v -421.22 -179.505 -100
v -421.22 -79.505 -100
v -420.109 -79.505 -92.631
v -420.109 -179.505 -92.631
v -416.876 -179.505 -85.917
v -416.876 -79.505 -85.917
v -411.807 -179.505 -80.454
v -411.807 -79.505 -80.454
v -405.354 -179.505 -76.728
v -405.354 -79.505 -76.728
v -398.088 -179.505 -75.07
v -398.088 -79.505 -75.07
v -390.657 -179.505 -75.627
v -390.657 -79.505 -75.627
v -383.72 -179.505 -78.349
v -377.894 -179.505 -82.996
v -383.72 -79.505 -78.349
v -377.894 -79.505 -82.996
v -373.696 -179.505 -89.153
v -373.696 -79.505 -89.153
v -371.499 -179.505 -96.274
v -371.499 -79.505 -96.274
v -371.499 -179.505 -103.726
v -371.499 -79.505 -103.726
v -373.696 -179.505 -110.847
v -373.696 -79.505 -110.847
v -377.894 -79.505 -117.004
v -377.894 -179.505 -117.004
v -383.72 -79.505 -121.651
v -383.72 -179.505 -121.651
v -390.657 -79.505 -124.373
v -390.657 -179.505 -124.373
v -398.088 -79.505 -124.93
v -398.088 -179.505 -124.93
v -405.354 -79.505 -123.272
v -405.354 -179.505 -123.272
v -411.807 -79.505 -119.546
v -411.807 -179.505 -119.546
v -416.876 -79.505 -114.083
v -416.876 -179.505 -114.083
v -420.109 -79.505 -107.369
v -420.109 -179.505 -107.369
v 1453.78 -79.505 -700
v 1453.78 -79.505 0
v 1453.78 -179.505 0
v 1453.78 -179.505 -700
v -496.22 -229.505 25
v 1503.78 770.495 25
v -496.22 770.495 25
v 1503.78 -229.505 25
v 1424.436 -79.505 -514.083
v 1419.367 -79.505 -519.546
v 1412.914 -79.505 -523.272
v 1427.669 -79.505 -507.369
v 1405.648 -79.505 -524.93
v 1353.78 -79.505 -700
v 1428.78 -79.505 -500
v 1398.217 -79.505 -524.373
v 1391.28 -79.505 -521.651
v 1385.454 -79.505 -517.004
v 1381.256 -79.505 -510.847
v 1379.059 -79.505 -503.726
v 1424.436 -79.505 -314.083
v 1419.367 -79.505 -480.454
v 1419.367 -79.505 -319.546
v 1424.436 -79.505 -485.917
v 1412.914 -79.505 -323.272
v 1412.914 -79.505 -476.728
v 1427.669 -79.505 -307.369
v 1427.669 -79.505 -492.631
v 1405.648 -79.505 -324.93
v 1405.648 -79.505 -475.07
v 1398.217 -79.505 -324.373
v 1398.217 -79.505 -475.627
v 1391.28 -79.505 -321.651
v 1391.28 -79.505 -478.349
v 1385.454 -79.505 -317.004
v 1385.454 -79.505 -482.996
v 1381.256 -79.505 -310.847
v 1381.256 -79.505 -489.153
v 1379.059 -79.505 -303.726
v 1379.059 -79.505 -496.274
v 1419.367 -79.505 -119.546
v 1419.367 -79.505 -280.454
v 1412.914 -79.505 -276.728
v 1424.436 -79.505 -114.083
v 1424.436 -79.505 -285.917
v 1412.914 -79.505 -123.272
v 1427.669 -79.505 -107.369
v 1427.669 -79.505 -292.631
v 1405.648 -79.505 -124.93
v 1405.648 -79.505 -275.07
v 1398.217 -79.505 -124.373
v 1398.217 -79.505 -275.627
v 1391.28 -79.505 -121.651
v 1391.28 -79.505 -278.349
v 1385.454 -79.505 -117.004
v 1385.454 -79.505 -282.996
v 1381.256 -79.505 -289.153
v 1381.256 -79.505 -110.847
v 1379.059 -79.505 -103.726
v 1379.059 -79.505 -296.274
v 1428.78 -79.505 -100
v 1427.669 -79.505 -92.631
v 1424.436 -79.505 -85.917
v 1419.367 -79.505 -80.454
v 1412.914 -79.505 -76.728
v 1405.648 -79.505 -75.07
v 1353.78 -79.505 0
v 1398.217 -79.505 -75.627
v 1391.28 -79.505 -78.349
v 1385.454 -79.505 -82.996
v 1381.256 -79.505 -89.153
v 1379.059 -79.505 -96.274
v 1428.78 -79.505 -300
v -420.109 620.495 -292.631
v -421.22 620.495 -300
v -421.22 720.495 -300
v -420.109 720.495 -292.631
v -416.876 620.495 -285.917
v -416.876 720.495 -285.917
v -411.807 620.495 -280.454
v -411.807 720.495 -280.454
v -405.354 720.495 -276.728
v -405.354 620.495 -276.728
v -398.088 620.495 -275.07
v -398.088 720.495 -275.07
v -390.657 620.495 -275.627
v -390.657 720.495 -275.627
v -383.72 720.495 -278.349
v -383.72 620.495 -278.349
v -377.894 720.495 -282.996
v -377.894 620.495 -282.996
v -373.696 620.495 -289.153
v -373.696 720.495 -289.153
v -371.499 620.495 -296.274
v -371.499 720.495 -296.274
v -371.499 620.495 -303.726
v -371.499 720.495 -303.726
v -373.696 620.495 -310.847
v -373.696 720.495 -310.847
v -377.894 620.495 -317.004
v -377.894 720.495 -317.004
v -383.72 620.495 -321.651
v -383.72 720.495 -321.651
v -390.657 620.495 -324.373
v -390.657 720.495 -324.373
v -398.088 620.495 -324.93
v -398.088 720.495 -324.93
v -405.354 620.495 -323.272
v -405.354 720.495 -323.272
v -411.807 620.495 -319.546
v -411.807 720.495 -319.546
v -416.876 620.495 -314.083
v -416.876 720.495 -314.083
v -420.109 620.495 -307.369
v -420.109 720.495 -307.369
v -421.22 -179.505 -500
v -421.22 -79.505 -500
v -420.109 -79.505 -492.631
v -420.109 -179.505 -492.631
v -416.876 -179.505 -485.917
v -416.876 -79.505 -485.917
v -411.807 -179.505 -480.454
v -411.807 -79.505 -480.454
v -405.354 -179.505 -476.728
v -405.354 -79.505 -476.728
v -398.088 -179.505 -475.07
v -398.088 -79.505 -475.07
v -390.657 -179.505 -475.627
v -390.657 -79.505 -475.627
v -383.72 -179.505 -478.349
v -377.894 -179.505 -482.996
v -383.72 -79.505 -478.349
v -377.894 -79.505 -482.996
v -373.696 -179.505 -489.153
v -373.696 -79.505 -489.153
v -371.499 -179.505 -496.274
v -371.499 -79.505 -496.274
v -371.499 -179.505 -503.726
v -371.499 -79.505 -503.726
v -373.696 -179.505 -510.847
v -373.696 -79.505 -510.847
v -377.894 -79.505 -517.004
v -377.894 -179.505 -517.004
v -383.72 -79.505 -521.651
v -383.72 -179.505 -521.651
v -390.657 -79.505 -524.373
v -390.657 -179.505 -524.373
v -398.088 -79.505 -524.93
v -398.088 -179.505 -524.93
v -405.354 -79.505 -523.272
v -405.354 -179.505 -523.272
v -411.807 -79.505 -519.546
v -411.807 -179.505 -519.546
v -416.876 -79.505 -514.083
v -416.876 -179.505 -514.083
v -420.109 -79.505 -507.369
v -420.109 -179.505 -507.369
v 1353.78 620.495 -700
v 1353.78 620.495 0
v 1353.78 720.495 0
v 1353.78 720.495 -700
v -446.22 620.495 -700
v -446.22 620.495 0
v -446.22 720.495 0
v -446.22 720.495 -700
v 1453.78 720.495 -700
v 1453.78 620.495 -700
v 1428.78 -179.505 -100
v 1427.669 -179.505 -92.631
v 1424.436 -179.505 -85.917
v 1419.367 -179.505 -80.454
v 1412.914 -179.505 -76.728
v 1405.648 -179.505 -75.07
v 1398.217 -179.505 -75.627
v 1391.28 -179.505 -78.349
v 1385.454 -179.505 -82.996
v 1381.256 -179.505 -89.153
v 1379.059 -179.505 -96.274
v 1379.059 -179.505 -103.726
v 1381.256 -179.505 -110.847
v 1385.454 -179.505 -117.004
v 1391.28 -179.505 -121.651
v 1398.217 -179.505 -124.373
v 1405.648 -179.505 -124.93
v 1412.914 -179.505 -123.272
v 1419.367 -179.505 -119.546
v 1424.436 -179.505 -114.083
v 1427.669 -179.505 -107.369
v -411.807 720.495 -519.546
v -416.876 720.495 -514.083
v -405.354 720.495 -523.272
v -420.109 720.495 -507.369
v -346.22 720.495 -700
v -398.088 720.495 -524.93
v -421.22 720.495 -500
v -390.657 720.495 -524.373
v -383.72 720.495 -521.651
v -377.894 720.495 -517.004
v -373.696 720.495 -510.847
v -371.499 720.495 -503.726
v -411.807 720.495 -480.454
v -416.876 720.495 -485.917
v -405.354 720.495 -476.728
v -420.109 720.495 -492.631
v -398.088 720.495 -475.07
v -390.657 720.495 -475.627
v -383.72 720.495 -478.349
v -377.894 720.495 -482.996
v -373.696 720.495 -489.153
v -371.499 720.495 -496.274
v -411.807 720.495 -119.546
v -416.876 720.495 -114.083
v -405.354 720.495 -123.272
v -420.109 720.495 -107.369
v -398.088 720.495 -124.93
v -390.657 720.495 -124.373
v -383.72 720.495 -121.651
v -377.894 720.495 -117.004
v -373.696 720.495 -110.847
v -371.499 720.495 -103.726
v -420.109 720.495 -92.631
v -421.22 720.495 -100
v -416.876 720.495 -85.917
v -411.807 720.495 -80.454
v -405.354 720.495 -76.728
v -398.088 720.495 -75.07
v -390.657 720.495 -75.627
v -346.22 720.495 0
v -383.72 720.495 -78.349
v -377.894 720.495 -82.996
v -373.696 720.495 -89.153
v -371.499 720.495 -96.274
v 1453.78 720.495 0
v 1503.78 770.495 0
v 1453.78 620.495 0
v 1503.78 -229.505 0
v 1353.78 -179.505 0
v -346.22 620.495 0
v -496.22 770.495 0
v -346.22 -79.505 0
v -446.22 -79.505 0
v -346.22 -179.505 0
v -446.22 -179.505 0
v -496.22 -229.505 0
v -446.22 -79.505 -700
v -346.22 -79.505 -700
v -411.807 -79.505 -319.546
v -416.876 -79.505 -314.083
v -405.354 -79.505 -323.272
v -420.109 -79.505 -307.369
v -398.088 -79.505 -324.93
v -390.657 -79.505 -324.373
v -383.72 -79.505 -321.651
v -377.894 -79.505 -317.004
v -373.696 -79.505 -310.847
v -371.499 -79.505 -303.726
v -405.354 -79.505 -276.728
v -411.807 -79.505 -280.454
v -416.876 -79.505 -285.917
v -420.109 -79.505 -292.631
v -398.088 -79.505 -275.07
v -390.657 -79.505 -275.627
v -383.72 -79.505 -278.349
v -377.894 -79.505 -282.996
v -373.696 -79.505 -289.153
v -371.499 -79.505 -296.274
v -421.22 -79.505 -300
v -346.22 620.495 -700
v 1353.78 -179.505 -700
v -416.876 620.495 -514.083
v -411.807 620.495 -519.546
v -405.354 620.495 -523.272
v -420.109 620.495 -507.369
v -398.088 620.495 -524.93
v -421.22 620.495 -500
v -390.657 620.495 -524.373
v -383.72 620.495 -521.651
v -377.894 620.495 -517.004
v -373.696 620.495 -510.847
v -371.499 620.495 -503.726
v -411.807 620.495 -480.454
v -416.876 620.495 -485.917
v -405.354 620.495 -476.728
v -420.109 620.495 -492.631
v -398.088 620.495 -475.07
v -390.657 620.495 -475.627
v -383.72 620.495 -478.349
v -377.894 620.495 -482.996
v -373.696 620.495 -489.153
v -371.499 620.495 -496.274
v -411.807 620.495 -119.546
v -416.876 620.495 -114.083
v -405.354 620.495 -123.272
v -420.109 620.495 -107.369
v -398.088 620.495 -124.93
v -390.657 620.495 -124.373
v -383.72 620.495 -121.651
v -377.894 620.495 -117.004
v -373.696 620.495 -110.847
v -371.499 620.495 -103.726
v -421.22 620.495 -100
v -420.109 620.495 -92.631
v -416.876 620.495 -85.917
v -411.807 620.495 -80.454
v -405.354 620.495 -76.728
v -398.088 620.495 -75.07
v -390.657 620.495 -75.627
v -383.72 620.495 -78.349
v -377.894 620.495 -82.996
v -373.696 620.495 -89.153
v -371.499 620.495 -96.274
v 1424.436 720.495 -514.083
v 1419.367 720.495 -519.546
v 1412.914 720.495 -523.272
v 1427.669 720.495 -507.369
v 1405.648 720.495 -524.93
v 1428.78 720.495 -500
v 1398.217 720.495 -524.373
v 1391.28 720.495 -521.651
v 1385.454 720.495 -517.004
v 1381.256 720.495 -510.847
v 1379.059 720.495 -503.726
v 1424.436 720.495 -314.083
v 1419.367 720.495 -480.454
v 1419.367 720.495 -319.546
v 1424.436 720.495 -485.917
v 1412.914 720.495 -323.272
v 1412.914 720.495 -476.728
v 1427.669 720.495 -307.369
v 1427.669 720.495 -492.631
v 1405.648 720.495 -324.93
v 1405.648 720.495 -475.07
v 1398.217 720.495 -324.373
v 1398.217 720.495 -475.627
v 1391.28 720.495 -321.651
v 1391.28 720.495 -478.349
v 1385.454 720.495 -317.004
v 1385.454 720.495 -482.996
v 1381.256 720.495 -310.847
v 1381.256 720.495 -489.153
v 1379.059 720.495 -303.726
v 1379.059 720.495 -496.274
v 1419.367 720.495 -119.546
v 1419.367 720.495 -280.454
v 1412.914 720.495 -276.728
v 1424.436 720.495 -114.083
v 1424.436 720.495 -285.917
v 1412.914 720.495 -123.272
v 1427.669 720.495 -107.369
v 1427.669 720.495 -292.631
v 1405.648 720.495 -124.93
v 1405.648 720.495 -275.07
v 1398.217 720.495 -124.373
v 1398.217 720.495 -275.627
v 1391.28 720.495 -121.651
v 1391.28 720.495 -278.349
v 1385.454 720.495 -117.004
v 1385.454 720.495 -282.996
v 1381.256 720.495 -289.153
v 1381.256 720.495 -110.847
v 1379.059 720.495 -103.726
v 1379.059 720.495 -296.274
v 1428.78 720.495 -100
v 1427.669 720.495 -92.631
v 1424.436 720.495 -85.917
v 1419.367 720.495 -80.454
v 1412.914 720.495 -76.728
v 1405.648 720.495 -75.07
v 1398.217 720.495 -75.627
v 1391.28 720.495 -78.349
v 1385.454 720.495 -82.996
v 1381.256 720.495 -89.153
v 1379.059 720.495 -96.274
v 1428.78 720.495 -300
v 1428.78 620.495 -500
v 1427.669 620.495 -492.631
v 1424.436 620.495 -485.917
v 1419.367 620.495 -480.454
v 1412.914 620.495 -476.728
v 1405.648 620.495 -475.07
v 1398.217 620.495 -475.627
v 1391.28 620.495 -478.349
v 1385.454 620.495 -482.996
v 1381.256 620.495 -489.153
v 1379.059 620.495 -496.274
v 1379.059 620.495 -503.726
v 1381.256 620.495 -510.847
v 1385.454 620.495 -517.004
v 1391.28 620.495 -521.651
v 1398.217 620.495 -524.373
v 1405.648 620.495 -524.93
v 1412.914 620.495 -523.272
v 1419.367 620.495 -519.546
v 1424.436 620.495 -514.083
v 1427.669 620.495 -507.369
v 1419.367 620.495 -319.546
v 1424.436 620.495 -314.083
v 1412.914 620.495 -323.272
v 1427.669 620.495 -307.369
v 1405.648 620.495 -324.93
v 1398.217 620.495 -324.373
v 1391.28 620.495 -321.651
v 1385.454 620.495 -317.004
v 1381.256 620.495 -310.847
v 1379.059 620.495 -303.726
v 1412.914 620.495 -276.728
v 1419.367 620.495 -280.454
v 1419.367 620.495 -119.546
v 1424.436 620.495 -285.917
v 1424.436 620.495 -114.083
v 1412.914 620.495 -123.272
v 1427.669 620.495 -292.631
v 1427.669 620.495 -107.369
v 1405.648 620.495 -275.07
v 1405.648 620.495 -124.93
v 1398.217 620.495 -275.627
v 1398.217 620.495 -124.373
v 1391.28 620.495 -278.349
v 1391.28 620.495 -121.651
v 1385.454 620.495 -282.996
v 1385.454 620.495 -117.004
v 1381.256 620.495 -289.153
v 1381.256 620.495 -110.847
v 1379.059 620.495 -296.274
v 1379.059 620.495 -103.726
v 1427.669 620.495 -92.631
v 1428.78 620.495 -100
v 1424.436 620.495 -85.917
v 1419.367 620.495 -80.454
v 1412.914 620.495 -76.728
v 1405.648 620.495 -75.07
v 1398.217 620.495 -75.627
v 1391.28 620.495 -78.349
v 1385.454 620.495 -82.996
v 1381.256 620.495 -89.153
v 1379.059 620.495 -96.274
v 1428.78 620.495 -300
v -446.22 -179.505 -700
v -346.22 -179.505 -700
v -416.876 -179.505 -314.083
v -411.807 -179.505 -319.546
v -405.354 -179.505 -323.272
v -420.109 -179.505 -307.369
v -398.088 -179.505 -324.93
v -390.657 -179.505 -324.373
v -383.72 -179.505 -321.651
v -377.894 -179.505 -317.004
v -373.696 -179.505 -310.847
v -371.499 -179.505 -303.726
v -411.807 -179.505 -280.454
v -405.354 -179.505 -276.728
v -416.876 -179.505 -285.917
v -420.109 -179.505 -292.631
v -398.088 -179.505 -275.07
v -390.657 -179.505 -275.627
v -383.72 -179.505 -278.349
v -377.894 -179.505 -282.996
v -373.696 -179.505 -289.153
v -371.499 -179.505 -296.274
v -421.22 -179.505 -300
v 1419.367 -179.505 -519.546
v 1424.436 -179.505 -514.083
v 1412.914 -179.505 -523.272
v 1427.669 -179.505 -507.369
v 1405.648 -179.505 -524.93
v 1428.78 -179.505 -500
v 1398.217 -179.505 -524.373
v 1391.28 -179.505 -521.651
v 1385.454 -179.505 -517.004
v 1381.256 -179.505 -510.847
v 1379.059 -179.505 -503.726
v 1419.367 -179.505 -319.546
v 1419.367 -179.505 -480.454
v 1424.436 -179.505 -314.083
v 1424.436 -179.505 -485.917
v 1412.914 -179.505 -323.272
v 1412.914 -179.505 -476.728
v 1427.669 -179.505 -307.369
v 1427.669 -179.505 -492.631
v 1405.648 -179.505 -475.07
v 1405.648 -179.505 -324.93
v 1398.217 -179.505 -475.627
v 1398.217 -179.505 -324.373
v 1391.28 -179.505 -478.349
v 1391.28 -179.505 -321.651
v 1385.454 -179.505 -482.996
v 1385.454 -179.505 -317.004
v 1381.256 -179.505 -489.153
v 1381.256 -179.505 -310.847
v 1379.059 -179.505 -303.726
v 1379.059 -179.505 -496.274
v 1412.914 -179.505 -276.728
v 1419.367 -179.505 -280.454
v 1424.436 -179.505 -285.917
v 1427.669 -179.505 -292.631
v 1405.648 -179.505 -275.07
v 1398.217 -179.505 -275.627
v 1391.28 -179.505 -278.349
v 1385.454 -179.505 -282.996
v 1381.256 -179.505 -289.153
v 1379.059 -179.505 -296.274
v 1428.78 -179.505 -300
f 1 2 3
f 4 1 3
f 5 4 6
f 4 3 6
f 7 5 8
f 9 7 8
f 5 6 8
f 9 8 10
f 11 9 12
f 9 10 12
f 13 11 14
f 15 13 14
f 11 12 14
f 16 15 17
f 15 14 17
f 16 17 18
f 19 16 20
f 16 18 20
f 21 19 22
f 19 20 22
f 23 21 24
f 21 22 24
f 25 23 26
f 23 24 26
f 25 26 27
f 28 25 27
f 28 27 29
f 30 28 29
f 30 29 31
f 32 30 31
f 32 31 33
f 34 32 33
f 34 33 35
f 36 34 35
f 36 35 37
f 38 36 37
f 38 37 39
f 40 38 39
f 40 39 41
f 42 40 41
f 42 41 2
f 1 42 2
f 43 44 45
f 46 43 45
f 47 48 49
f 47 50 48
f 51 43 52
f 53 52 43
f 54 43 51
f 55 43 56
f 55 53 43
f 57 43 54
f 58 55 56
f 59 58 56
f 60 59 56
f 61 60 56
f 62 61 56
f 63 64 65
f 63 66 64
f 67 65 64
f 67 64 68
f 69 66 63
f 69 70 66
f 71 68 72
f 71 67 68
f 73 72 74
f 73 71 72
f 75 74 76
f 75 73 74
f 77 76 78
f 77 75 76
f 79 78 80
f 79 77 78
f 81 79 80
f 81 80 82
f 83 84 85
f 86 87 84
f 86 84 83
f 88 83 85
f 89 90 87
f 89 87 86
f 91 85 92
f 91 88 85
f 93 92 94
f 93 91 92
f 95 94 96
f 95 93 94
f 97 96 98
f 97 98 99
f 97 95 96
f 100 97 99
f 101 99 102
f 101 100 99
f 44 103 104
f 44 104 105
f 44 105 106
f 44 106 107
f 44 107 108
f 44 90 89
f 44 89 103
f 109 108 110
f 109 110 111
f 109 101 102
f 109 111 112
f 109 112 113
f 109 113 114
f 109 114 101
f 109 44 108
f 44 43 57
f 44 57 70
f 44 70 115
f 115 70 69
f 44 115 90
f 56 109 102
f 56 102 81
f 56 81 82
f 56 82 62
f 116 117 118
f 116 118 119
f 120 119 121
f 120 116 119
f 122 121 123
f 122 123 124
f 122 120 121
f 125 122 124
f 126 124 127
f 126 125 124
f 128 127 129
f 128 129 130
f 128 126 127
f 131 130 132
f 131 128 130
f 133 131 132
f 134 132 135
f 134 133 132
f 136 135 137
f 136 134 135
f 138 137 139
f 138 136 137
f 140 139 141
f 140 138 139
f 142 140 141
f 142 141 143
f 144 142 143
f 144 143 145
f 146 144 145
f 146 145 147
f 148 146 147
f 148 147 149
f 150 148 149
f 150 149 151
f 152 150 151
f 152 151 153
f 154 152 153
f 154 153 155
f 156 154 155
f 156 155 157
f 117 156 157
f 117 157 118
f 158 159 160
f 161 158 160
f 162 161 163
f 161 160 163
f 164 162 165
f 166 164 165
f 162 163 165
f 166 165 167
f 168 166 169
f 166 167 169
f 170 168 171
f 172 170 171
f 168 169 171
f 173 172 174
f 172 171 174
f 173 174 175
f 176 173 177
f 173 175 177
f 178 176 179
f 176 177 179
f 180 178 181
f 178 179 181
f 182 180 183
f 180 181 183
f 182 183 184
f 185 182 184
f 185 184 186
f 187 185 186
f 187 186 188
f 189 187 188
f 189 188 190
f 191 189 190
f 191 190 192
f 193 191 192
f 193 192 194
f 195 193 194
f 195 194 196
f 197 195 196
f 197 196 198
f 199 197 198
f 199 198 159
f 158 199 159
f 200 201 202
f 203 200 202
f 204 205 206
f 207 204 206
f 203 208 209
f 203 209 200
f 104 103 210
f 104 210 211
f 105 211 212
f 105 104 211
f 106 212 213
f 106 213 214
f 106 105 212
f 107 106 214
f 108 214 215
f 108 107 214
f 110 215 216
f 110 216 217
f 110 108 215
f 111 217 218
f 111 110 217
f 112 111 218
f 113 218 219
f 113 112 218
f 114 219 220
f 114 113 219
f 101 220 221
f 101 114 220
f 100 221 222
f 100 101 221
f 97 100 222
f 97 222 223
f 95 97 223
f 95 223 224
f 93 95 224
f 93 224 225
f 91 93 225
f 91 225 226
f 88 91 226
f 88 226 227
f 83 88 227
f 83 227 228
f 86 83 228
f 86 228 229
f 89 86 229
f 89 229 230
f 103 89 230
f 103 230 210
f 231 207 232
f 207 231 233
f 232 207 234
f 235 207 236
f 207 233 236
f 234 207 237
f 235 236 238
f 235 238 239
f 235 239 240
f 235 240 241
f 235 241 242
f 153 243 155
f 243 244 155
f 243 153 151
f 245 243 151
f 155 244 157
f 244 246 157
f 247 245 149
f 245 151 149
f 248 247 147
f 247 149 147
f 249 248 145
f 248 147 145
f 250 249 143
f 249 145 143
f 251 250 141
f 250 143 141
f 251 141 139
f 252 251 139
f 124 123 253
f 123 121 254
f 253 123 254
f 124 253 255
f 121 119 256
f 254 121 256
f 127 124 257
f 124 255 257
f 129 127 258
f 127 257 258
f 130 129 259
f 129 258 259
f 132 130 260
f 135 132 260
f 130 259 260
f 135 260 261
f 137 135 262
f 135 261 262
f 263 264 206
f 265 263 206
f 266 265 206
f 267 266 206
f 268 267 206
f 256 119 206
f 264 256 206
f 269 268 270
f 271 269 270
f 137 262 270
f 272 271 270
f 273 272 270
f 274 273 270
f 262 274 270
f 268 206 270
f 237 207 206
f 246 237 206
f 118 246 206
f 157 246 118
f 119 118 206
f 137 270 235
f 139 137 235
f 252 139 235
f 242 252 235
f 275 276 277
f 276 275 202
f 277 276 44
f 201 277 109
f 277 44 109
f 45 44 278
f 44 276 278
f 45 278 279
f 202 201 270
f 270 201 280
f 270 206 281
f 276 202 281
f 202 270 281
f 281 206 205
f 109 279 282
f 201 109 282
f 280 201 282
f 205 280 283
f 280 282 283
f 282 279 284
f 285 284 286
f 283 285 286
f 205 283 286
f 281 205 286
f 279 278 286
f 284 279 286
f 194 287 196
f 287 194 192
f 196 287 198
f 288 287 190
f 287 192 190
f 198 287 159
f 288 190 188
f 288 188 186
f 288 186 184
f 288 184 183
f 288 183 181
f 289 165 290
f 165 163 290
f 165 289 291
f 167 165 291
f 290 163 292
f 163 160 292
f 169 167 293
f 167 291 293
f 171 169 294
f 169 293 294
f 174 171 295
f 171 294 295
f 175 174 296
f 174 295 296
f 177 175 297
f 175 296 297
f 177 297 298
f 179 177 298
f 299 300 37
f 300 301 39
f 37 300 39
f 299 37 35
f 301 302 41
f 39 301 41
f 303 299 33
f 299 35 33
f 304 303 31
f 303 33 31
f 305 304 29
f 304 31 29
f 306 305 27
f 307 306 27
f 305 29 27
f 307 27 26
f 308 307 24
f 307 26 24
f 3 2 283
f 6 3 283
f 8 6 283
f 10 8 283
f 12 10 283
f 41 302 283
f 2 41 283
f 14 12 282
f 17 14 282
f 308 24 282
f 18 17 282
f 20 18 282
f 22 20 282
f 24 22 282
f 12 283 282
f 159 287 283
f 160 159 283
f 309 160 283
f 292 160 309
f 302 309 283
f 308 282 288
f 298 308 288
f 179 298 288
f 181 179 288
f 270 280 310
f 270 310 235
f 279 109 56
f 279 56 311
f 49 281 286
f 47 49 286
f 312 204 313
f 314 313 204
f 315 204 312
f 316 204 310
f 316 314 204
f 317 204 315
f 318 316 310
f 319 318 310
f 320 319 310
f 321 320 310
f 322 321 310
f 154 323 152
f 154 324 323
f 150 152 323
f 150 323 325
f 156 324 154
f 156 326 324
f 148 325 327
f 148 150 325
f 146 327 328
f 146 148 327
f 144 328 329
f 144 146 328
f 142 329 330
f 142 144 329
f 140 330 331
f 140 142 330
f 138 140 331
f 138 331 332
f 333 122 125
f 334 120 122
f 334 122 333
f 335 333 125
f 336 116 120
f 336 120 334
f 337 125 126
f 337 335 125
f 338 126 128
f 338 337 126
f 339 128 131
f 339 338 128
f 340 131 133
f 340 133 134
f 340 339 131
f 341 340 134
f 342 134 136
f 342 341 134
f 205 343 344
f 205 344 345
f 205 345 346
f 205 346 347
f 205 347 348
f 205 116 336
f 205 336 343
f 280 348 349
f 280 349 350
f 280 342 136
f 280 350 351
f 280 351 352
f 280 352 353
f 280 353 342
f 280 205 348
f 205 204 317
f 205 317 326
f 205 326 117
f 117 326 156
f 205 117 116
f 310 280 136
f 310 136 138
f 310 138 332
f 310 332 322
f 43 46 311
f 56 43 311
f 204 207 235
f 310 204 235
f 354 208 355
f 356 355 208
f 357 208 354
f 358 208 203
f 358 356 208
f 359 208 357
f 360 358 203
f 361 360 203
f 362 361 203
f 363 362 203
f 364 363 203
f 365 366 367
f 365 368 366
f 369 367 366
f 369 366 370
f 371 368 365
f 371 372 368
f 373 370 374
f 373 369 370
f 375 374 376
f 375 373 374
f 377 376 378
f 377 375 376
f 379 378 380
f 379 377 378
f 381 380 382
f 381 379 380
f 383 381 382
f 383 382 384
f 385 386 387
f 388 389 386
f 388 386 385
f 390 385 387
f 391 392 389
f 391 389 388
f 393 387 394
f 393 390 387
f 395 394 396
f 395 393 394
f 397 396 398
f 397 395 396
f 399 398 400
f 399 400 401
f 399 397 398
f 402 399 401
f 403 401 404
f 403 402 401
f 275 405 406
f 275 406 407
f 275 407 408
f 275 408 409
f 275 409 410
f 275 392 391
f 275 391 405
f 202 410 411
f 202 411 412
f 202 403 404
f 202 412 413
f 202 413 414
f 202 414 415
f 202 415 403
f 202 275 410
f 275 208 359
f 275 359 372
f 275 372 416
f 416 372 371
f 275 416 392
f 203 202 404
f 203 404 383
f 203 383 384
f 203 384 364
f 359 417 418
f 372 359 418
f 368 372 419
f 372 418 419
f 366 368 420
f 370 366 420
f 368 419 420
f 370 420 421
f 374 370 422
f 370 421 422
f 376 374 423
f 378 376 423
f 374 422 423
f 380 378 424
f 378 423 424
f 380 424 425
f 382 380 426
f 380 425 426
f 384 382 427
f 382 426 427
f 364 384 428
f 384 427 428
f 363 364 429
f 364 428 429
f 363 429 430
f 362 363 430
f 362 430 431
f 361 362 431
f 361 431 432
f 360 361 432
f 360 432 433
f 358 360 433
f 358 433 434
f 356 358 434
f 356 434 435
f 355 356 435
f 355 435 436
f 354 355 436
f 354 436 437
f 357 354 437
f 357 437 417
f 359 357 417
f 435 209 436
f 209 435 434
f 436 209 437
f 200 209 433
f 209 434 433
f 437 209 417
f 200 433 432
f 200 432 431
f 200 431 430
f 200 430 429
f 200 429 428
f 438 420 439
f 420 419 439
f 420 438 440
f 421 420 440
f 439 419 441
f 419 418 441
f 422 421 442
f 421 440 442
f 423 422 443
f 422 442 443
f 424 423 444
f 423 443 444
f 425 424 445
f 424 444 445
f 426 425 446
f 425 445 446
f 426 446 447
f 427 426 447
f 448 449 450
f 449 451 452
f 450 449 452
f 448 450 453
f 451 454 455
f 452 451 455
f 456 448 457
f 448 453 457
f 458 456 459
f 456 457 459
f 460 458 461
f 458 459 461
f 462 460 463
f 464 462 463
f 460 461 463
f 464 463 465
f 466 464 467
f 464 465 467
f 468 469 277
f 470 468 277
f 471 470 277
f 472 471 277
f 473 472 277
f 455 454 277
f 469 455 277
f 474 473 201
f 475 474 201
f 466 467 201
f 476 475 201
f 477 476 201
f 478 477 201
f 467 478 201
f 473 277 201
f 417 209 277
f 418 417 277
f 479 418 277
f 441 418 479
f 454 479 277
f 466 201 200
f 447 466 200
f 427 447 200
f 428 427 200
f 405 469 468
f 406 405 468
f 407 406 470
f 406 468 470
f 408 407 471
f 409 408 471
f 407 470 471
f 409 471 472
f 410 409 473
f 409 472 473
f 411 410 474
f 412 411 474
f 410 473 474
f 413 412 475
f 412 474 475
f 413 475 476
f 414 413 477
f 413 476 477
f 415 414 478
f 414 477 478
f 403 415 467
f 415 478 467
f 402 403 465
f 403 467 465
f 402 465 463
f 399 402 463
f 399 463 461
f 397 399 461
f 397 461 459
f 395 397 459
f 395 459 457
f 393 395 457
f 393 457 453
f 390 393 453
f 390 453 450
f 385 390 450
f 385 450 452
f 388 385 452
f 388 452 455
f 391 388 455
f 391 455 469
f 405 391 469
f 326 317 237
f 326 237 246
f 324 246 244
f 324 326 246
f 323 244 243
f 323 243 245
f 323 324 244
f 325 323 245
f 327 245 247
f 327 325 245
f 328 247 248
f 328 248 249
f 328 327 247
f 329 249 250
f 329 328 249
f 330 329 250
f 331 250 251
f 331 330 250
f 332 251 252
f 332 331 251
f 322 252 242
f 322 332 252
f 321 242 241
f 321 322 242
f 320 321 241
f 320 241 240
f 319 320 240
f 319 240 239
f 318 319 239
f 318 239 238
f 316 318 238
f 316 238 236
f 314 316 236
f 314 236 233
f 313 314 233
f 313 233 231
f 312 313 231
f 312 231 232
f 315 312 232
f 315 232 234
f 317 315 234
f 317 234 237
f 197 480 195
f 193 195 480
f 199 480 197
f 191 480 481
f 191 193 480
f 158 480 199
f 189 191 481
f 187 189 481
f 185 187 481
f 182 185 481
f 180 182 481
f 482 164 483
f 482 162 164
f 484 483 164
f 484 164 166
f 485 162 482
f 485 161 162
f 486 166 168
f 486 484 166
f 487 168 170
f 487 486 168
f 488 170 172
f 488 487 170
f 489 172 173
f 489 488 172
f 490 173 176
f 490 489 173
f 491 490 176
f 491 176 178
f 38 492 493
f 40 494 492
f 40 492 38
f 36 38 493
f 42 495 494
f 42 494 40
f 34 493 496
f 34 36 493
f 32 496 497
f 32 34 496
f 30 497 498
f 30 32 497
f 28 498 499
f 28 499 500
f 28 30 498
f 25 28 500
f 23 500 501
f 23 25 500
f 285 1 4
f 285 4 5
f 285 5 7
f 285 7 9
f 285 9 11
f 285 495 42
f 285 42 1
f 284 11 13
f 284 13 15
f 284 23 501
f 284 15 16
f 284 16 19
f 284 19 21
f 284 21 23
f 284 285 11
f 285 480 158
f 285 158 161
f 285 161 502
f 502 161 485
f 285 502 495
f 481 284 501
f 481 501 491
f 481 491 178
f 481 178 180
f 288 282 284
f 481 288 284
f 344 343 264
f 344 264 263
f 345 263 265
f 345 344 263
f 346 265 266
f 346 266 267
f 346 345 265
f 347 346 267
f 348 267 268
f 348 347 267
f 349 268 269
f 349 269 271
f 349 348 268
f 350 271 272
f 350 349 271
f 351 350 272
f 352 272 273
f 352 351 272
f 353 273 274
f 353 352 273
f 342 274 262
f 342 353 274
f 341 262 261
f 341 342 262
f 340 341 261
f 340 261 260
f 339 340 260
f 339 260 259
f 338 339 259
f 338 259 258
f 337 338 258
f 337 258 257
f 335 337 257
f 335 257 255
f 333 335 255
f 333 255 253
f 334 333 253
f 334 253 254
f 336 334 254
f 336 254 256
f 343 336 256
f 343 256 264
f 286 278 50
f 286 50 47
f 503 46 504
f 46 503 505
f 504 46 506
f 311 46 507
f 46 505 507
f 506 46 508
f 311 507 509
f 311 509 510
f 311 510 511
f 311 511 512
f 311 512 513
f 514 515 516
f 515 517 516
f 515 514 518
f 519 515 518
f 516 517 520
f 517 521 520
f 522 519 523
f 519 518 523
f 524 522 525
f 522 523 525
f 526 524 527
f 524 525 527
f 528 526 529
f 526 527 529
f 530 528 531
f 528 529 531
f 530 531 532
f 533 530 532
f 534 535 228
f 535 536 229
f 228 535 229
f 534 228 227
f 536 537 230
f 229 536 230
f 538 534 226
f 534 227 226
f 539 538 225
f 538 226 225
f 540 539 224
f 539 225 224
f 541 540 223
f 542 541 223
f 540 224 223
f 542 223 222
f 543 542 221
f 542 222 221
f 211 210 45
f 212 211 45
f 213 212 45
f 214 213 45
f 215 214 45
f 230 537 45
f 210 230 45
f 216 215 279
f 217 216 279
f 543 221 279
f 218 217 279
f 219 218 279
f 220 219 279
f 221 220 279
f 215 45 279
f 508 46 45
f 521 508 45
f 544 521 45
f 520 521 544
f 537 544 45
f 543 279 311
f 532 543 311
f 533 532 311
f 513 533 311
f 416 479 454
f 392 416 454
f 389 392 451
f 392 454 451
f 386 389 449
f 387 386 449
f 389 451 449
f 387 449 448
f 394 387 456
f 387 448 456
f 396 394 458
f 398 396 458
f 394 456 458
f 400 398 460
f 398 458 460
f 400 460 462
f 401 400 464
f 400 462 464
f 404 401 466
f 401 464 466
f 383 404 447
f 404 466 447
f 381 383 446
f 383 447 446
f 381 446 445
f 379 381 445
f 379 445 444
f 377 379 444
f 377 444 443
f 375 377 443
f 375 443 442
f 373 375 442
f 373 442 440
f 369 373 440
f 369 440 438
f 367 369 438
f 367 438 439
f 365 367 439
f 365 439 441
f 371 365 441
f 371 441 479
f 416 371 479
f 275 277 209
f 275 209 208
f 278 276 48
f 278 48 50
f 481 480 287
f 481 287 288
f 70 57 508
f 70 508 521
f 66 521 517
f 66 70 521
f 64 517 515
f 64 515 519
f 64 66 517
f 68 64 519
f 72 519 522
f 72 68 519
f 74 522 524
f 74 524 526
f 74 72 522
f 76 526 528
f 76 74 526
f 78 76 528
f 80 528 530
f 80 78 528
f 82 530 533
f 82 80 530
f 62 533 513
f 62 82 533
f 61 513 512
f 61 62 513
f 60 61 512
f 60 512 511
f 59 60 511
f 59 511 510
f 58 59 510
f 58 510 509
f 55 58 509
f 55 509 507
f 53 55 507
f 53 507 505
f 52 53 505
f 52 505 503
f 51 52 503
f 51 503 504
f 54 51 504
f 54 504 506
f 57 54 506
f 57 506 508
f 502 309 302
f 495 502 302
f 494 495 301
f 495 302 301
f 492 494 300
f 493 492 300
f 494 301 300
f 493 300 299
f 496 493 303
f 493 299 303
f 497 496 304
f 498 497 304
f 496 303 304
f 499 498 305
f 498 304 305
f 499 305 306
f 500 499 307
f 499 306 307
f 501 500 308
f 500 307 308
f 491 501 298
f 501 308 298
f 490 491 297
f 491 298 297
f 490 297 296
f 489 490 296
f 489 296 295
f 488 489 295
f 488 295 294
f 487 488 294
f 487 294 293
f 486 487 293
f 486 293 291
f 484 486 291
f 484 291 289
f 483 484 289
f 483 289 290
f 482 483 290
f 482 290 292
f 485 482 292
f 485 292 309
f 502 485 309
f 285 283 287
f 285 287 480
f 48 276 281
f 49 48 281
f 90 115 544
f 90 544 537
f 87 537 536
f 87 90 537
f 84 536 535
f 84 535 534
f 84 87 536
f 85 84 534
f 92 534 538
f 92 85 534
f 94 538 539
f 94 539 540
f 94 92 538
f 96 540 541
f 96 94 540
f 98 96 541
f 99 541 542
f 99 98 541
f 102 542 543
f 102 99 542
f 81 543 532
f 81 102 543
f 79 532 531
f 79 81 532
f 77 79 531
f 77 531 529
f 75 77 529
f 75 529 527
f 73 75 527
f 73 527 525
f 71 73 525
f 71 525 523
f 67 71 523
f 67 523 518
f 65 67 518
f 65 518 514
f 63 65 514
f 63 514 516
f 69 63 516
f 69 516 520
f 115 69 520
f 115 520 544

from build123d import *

# Parameters (mm, degrees)
F0_W     = 1000
F0_H     = 500
F1_DEPTH = 25
F2_W     = 100
F2_H     = 100
F3_DEPTH = 700
F5_D     = 50
F7_D     = 50
F9_D     = 50


with BuildPart() as f1:
    # F0 (on Top) → F1 (new body)
    with BuildSketch(Plane.XY):
        with Locations((3.7799999118, 20.495297656)):
            Rectangle(F0_W, F0_H)
    extrude(amount=F1_DEPTH)

    # F2 (on face) → F3 (join)
    with BuildSketch(Plane(origin=(0, 0, 0), x_dir=(1, 0, 0), z_dir=(0, 0, -1))):
        with Locations((-396.2200000882, 129.504702344)):
            Rectangle(F2_W, F2_H)
    extrude(amount=F3_DEPTH)

    # F5 (through all)
    with Locations(Plane.XZ.offset(179.504702344)):
        with Locations((-396.2200000882, -500)):
            Hole(F5_D / 2)

    # F7 (through all)
    with Locations(Plane.XZ.offset(179.504702344)):
        with Locations((-396.2200000882, -300)):
            Hole(F7_D / 2)

    # F9 (through all)
    with Locations(Plane.XZ.offset(179.504702344)):
        with Locations((-396.2200000882, -100)):
            Hole(F9_D / 2)

    # F12: F1 across plane


with BuildPart() as f1_1:
    add(f1.part)
    add(f1.part.mirror(Plane(origin=(3.7799999118, 270.495297656, 12.5), x_dir=(-1, 0, 0), z_dir=(0, 1, 0))))

    # F14: F1 across plane


with BuildPart() as f1_2:
    add(f1_1.part)
    add(f1_1.part.mirror(Plane(origin=(503.7799999118, 270.495297656, 12.5), x_dir=(0, 1, 0), z_dir=(1, 0, 0))))


solid = f1_2.part
